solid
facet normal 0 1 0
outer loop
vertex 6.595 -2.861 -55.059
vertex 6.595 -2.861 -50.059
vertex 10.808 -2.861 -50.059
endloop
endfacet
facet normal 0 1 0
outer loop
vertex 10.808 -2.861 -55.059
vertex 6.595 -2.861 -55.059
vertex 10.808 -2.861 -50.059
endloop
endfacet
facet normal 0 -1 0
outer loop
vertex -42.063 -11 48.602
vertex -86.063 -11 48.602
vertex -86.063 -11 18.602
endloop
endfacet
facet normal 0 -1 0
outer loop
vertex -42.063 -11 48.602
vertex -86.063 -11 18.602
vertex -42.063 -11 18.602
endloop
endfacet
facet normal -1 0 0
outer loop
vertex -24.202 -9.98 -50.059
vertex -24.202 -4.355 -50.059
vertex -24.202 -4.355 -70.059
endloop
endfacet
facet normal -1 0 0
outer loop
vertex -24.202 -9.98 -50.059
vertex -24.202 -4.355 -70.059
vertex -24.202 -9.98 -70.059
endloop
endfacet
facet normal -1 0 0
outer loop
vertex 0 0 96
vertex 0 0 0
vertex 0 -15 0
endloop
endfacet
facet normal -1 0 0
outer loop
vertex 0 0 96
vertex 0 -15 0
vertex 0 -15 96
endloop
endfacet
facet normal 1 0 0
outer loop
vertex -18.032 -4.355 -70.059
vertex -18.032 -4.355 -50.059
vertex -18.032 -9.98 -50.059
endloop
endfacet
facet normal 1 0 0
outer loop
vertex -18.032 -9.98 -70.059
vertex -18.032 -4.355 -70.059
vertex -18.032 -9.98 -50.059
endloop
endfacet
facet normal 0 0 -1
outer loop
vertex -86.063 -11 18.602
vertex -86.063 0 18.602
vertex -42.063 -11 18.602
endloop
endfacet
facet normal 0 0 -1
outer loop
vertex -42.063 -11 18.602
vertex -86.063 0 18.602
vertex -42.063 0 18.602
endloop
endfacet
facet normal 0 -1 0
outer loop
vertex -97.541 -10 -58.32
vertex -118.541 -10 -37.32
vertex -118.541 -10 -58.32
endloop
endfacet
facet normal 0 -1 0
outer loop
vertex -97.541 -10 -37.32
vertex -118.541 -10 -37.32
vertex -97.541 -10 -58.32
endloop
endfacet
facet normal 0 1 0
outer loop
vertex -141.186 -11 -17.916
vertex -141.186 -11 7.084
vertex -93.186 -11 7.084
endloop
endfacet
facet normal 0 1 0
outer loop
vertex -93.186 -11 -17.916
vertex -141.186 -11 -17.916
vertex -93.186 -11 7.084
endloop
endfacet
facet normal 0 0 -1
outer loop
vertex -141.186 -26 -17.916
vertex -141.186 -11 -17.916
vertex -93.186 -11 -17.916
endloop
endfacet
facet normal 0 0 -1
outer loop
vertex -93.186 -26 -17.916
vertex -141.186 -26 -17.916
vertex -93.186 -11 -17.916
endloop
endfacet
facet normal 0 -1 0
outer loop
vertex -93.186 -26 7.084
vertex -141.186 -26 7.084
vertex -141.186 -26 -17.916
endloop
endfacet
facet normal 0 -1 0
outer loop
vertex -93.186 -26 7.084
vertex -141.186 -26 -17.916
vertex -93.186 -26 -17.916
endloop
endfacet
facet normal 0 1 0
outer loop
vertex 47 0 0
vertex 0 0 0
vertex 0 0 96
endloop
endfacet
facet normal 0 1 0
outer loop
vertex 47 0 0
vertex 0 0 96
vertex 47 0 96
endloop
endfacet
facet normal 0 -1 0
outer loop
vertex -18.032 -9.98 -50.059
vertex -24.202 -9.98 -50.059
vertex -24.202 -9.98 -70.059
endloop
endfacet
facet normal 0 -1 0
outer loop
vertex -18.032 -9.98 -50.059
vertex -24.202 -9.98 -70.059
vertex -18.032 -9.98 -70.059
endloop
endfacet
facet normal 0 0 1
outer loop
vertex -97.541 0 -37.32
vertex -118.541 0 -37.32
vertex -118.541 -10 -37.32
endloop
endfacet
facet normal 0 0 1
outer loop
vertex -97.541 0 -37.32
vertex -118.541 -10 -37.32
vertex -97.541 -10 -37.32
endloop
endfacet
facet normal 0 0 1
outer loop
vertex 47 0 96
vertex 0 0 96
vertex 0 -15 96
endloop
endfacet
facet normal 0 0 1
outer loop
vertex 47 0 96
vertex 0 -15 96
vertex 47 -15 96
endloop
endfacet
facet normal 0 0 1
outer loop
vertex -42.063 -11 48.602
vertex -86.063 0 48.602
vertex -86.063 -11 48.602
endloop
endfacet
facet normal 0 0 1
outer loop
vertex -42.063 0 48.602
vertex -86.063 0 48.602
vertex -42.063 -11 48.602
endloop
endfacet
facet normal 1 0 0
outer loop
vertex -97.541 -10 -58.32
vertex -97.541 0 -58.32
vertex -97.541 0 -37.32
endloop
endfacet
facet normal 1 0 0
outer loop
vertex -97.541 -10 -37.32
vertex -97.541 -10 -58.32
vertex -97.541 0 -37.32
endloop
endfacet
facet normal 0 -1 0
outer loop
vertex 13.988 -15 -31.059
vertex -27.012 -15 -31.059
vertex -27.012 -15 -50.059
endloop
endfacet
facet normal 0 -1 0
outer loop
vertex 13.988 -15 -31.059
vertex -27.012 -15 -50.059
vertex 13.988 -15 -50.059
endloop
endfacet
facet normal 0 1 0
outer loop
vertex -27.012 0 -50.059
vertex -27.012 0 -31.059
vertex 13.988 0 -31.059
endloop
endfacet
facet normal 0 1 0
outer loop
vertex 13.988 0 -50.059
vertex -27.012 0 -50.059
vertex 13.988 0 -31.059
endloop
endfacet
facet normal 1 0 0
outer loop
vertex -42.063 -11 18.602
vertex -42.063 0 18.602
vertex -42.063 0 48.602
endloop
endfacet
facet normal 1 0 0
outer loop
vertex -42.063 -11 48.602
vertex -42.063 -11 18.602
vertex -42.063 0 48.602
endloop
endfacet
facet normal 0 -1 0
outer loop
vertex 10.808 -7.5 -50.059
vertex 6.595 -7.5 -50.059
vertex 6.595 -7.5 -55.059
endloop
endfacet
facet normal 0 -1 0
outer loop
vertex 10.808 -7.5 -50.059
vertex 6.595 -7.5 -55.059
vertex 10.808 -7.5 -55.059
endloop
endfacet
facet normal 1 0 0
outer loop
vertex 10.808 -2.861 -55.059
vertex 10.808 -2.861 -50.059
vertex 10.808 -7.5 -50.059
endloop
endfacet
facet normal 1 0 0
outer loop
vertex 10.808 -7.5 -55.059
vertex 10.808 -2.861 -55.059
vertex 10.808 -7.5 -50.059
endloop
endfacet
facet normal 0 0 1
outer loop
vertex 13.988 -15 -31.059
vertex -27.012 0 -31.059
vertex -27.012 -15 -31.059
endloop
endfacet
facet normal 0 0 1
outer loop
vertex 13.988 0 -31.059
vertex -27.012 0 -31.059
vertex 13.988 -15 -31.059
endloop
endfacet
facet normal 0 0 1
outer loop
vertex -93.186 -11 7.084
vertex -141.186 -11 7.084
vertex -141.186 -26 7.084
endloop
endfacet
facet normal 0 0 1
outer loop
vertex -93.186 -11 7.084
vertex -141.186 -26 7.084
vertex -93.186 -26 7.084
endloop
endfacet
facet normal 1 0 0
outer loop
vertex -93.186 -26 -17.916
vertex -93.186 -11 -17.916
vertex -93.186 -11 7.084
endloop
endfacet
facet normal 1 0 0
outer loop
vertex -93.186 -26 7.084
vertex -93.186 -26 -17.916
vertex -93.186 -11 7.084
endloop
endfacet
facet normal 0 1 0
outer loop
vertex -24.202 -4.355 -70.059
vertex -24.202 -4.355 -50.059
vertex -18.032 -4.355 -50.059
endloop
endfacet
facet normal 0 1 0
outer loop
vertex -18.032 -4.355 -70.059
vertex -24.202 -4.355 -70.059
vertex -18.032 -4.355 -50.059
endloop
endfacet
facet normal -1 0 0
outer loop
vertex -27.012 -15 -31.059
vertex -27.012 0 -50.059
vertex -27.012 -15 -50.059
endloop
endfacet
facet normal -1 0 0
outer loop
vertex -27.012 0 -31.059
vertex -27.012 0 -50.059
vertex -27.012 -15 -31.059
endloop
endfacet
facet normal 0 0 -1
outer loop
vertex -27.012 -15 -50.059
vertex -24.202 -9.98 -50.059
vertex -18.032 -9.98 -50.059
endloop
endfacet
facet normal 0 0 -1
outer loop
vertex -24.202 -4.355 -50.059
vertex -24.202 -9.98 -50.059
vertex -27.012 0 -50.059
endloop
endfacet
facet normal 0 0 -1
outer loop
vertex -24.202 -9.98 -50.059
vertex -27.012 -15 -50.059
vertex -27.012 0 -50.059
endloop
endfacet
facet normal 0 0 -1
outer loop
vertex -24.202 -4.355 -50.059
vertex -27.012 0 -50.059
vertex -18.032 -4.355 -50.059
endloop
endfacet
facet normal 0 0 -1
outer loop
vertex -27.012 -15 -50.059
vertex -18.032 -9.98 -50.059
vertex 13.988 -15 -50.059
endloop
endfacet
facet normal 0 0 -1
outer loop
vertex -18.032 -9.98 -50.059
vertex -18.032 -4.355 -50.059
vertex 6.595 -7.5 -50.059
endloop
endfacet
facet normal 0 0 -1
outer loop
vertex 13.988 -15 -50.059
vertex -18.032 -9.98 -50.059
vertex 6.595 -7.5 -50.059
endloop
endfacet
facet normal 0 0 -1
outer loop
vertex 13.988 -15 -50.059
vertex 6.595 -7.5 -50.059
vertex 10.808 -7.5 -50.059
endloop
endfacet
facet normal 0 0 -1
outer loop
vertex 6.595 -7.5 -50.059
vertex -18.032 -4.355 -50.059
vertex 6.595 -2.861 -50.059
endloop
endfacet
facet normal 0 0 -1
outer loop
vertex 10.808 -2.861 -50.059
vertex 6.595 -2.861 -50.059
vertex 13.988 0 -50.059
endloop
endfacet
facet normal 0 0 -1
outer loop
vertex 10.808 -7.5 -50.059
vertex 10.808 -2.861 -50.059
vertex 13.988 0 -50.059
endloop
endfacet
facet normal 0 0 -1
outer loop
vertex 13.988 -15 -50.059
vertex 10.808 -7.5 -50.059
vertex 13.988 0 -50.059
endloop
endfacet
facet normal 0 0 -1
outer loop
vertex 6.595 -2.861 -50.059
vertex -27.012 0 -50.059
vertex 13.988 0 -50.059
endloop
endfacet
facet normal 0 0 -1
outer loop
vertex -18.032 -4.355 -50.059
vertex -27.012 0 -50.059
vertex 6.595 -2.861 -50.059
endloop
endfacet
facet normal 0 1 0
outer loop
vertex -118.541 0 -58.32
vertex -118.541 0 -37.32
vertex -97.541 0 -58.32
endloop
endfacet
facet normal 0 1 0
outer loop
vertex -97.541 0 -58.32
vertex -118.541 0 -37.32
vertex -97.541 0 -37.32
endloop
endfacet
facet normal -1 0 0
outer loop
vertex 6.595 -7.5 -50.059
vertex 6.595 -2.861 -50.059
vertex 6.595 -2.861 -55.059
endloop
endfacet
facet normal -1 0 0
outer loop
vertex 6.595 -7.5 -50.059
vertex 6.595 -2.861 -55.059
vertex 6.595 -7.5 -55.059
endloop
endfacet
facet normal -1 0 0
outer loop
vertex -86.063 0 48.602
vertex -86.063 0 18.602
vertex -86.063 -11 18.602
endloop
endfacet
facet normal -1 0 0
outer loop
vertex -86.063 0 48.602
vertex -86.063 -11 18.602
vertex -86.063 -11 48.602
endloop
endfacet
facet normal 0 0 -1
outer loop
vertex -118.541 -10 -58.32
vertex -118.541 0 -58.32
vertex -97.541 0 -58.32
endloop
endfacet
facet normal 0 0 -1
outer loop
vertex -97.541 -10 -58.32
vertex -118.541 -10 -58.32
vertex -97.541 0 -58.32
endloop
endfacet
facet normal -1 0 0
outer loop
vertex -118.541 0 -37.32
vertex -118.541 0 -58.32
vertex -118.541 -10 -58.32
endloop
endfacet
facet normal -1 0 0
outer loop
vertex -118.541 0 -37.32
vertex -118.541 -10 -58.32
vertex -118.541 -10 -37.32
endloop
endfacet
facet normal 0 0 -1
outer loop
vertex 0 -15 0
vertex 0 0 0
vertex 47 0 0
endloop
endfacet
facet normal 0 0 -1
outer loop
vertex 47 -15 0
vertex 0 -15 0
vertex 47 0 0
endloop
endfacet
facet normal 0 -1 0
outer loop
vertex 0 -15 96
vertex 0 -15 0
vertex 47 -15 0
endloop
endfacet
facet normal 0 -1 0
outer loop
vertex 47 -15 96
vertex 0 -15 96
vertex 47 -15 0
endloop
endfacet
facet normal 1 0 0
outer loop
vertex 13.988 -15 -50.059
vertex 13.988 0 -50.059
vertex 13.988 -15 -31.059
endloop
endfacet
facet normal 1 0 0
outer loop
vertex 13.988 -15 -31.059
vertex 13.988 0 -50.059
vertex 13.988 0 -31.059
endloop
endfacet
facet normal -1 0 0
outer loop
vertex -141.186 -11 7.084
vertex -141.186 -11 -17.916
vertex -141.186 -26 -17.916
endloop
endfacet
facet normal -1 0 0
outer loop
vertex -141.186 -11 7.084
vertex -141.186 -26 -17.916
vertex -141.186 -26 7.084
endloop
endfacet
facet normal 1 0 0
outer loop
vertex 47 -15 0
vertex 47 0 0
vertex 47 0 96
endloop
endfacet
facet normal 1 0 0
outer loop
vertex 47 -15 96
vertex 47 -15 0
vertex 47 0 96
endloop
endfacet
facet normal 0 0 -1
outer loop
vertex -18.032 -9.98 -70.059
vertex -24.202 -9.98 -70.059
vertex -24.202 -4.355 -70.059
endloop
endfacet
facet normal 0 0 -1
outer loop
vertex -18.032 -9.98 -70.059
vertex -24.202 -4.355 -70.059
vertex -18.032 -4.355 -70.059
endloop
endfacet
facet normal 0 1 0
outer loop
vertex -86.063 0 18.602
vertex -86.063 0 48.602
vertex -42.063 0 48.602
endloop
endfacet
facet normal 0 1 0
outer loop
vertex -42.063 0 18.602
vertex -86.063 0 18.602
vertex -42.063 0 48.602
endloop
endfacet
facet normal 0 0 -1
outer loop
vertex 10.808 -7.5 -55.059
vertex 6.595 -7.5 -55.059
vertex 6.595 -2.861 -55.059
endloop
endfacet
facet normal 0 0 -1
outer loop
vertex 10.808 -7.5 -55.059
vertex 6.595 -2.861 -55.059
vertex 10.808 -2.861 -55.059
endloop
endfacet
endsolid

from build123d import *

# Parameters (mm, degrees)
F0_W      = 47
F0_H      = 96
F1_DEPTH  = 15
F2_W      = 44
F2_H      = 30
F3_DEPTH  = 11
F4_W      = 48
F4_H      = 25
F5_DEPTH  = 15
F6_W      = 21
F6_H      = 21
F7_DEPTH  = 10
F8_W      = 41
F8_H      = 19
F9_DEPTH  = 15
F10_W     = 6.169355
F10_H     = 5.625
F11_DEPTH = 20
F10_W_2   = 4.212758
F10_H_2   = 4.639322
F12_DEPTH = 5


with BuildPart() as f1:
    # F0 (on Front) → F1 (new body)
    with BuildSketch(Plane.XZ):
        with Locations((23.5, 48)):
            Rectangle(F0_W, F0_H)
    extrude(amount=F1_DEPTH)


with BuildPart() as f3:
    # F2 (on Front) → F3 (new body)
    with BuildSketch(Plane.XZ):
        with Locations((-64.063305, 33.602437)):
            Rectangle(F2_W, F2_H)
    extrude(amount=F3_DEPTH)


with BuildPart() as f5:
    # F4 (on face) → F5 (new body)
    with BuildSketch(Plane.XZ.offset(11)):
        with Locations((-117.185794, -5.415953)):
            Rectangle(F4_W, F4_H)
    extrude(amount=F5_DEPTH)


with BuildPart() as f7:
    # F6 (on Front) → F7 (new body)
    with BuildSketch(Plane.XZ):
        with Locations((-108.04075, -47.820325)):
            Rectangle(F6_W, F6_H)
    extrude(amount=F7_DEPTH)


with BuildPart() as f9:
    # F8 (on Front) → F9 (new body)
    with BuildSketch(Plane.XZ):
        with Locations((-6.512047, -40.55878)):
            Rectangle(F8_W, F8_H)
    extrude(amount=F9_DEPTH)

    # F10 (on face) → F11 (join)
    with BuildSketch(Plane(origin=(0, 0, -50.05878), x_dir=(1, 0, 0), z_dir=(0, 0, -1))):
        with Locations((-21.117086, 7.167339)):
            Rectangle(F10_W, F10_H)
    extrude(amount=F11_DEPTH)

    # F10 (on face) → F12 (join)
    with BuildSketch(Plane(origin=(0, 0, -50.05878), x_dir=(1, 0, 0), z_dir=(0, 0, -1))):
        with Locations((8.701811, 5.180339)):
            Rectangle(F10_W_2, F10_H_2)
    extrude(amount=F12_DEPTH)


solid = Compound([f1.part, f3.part, f5.part, f7.part, f9.part])
